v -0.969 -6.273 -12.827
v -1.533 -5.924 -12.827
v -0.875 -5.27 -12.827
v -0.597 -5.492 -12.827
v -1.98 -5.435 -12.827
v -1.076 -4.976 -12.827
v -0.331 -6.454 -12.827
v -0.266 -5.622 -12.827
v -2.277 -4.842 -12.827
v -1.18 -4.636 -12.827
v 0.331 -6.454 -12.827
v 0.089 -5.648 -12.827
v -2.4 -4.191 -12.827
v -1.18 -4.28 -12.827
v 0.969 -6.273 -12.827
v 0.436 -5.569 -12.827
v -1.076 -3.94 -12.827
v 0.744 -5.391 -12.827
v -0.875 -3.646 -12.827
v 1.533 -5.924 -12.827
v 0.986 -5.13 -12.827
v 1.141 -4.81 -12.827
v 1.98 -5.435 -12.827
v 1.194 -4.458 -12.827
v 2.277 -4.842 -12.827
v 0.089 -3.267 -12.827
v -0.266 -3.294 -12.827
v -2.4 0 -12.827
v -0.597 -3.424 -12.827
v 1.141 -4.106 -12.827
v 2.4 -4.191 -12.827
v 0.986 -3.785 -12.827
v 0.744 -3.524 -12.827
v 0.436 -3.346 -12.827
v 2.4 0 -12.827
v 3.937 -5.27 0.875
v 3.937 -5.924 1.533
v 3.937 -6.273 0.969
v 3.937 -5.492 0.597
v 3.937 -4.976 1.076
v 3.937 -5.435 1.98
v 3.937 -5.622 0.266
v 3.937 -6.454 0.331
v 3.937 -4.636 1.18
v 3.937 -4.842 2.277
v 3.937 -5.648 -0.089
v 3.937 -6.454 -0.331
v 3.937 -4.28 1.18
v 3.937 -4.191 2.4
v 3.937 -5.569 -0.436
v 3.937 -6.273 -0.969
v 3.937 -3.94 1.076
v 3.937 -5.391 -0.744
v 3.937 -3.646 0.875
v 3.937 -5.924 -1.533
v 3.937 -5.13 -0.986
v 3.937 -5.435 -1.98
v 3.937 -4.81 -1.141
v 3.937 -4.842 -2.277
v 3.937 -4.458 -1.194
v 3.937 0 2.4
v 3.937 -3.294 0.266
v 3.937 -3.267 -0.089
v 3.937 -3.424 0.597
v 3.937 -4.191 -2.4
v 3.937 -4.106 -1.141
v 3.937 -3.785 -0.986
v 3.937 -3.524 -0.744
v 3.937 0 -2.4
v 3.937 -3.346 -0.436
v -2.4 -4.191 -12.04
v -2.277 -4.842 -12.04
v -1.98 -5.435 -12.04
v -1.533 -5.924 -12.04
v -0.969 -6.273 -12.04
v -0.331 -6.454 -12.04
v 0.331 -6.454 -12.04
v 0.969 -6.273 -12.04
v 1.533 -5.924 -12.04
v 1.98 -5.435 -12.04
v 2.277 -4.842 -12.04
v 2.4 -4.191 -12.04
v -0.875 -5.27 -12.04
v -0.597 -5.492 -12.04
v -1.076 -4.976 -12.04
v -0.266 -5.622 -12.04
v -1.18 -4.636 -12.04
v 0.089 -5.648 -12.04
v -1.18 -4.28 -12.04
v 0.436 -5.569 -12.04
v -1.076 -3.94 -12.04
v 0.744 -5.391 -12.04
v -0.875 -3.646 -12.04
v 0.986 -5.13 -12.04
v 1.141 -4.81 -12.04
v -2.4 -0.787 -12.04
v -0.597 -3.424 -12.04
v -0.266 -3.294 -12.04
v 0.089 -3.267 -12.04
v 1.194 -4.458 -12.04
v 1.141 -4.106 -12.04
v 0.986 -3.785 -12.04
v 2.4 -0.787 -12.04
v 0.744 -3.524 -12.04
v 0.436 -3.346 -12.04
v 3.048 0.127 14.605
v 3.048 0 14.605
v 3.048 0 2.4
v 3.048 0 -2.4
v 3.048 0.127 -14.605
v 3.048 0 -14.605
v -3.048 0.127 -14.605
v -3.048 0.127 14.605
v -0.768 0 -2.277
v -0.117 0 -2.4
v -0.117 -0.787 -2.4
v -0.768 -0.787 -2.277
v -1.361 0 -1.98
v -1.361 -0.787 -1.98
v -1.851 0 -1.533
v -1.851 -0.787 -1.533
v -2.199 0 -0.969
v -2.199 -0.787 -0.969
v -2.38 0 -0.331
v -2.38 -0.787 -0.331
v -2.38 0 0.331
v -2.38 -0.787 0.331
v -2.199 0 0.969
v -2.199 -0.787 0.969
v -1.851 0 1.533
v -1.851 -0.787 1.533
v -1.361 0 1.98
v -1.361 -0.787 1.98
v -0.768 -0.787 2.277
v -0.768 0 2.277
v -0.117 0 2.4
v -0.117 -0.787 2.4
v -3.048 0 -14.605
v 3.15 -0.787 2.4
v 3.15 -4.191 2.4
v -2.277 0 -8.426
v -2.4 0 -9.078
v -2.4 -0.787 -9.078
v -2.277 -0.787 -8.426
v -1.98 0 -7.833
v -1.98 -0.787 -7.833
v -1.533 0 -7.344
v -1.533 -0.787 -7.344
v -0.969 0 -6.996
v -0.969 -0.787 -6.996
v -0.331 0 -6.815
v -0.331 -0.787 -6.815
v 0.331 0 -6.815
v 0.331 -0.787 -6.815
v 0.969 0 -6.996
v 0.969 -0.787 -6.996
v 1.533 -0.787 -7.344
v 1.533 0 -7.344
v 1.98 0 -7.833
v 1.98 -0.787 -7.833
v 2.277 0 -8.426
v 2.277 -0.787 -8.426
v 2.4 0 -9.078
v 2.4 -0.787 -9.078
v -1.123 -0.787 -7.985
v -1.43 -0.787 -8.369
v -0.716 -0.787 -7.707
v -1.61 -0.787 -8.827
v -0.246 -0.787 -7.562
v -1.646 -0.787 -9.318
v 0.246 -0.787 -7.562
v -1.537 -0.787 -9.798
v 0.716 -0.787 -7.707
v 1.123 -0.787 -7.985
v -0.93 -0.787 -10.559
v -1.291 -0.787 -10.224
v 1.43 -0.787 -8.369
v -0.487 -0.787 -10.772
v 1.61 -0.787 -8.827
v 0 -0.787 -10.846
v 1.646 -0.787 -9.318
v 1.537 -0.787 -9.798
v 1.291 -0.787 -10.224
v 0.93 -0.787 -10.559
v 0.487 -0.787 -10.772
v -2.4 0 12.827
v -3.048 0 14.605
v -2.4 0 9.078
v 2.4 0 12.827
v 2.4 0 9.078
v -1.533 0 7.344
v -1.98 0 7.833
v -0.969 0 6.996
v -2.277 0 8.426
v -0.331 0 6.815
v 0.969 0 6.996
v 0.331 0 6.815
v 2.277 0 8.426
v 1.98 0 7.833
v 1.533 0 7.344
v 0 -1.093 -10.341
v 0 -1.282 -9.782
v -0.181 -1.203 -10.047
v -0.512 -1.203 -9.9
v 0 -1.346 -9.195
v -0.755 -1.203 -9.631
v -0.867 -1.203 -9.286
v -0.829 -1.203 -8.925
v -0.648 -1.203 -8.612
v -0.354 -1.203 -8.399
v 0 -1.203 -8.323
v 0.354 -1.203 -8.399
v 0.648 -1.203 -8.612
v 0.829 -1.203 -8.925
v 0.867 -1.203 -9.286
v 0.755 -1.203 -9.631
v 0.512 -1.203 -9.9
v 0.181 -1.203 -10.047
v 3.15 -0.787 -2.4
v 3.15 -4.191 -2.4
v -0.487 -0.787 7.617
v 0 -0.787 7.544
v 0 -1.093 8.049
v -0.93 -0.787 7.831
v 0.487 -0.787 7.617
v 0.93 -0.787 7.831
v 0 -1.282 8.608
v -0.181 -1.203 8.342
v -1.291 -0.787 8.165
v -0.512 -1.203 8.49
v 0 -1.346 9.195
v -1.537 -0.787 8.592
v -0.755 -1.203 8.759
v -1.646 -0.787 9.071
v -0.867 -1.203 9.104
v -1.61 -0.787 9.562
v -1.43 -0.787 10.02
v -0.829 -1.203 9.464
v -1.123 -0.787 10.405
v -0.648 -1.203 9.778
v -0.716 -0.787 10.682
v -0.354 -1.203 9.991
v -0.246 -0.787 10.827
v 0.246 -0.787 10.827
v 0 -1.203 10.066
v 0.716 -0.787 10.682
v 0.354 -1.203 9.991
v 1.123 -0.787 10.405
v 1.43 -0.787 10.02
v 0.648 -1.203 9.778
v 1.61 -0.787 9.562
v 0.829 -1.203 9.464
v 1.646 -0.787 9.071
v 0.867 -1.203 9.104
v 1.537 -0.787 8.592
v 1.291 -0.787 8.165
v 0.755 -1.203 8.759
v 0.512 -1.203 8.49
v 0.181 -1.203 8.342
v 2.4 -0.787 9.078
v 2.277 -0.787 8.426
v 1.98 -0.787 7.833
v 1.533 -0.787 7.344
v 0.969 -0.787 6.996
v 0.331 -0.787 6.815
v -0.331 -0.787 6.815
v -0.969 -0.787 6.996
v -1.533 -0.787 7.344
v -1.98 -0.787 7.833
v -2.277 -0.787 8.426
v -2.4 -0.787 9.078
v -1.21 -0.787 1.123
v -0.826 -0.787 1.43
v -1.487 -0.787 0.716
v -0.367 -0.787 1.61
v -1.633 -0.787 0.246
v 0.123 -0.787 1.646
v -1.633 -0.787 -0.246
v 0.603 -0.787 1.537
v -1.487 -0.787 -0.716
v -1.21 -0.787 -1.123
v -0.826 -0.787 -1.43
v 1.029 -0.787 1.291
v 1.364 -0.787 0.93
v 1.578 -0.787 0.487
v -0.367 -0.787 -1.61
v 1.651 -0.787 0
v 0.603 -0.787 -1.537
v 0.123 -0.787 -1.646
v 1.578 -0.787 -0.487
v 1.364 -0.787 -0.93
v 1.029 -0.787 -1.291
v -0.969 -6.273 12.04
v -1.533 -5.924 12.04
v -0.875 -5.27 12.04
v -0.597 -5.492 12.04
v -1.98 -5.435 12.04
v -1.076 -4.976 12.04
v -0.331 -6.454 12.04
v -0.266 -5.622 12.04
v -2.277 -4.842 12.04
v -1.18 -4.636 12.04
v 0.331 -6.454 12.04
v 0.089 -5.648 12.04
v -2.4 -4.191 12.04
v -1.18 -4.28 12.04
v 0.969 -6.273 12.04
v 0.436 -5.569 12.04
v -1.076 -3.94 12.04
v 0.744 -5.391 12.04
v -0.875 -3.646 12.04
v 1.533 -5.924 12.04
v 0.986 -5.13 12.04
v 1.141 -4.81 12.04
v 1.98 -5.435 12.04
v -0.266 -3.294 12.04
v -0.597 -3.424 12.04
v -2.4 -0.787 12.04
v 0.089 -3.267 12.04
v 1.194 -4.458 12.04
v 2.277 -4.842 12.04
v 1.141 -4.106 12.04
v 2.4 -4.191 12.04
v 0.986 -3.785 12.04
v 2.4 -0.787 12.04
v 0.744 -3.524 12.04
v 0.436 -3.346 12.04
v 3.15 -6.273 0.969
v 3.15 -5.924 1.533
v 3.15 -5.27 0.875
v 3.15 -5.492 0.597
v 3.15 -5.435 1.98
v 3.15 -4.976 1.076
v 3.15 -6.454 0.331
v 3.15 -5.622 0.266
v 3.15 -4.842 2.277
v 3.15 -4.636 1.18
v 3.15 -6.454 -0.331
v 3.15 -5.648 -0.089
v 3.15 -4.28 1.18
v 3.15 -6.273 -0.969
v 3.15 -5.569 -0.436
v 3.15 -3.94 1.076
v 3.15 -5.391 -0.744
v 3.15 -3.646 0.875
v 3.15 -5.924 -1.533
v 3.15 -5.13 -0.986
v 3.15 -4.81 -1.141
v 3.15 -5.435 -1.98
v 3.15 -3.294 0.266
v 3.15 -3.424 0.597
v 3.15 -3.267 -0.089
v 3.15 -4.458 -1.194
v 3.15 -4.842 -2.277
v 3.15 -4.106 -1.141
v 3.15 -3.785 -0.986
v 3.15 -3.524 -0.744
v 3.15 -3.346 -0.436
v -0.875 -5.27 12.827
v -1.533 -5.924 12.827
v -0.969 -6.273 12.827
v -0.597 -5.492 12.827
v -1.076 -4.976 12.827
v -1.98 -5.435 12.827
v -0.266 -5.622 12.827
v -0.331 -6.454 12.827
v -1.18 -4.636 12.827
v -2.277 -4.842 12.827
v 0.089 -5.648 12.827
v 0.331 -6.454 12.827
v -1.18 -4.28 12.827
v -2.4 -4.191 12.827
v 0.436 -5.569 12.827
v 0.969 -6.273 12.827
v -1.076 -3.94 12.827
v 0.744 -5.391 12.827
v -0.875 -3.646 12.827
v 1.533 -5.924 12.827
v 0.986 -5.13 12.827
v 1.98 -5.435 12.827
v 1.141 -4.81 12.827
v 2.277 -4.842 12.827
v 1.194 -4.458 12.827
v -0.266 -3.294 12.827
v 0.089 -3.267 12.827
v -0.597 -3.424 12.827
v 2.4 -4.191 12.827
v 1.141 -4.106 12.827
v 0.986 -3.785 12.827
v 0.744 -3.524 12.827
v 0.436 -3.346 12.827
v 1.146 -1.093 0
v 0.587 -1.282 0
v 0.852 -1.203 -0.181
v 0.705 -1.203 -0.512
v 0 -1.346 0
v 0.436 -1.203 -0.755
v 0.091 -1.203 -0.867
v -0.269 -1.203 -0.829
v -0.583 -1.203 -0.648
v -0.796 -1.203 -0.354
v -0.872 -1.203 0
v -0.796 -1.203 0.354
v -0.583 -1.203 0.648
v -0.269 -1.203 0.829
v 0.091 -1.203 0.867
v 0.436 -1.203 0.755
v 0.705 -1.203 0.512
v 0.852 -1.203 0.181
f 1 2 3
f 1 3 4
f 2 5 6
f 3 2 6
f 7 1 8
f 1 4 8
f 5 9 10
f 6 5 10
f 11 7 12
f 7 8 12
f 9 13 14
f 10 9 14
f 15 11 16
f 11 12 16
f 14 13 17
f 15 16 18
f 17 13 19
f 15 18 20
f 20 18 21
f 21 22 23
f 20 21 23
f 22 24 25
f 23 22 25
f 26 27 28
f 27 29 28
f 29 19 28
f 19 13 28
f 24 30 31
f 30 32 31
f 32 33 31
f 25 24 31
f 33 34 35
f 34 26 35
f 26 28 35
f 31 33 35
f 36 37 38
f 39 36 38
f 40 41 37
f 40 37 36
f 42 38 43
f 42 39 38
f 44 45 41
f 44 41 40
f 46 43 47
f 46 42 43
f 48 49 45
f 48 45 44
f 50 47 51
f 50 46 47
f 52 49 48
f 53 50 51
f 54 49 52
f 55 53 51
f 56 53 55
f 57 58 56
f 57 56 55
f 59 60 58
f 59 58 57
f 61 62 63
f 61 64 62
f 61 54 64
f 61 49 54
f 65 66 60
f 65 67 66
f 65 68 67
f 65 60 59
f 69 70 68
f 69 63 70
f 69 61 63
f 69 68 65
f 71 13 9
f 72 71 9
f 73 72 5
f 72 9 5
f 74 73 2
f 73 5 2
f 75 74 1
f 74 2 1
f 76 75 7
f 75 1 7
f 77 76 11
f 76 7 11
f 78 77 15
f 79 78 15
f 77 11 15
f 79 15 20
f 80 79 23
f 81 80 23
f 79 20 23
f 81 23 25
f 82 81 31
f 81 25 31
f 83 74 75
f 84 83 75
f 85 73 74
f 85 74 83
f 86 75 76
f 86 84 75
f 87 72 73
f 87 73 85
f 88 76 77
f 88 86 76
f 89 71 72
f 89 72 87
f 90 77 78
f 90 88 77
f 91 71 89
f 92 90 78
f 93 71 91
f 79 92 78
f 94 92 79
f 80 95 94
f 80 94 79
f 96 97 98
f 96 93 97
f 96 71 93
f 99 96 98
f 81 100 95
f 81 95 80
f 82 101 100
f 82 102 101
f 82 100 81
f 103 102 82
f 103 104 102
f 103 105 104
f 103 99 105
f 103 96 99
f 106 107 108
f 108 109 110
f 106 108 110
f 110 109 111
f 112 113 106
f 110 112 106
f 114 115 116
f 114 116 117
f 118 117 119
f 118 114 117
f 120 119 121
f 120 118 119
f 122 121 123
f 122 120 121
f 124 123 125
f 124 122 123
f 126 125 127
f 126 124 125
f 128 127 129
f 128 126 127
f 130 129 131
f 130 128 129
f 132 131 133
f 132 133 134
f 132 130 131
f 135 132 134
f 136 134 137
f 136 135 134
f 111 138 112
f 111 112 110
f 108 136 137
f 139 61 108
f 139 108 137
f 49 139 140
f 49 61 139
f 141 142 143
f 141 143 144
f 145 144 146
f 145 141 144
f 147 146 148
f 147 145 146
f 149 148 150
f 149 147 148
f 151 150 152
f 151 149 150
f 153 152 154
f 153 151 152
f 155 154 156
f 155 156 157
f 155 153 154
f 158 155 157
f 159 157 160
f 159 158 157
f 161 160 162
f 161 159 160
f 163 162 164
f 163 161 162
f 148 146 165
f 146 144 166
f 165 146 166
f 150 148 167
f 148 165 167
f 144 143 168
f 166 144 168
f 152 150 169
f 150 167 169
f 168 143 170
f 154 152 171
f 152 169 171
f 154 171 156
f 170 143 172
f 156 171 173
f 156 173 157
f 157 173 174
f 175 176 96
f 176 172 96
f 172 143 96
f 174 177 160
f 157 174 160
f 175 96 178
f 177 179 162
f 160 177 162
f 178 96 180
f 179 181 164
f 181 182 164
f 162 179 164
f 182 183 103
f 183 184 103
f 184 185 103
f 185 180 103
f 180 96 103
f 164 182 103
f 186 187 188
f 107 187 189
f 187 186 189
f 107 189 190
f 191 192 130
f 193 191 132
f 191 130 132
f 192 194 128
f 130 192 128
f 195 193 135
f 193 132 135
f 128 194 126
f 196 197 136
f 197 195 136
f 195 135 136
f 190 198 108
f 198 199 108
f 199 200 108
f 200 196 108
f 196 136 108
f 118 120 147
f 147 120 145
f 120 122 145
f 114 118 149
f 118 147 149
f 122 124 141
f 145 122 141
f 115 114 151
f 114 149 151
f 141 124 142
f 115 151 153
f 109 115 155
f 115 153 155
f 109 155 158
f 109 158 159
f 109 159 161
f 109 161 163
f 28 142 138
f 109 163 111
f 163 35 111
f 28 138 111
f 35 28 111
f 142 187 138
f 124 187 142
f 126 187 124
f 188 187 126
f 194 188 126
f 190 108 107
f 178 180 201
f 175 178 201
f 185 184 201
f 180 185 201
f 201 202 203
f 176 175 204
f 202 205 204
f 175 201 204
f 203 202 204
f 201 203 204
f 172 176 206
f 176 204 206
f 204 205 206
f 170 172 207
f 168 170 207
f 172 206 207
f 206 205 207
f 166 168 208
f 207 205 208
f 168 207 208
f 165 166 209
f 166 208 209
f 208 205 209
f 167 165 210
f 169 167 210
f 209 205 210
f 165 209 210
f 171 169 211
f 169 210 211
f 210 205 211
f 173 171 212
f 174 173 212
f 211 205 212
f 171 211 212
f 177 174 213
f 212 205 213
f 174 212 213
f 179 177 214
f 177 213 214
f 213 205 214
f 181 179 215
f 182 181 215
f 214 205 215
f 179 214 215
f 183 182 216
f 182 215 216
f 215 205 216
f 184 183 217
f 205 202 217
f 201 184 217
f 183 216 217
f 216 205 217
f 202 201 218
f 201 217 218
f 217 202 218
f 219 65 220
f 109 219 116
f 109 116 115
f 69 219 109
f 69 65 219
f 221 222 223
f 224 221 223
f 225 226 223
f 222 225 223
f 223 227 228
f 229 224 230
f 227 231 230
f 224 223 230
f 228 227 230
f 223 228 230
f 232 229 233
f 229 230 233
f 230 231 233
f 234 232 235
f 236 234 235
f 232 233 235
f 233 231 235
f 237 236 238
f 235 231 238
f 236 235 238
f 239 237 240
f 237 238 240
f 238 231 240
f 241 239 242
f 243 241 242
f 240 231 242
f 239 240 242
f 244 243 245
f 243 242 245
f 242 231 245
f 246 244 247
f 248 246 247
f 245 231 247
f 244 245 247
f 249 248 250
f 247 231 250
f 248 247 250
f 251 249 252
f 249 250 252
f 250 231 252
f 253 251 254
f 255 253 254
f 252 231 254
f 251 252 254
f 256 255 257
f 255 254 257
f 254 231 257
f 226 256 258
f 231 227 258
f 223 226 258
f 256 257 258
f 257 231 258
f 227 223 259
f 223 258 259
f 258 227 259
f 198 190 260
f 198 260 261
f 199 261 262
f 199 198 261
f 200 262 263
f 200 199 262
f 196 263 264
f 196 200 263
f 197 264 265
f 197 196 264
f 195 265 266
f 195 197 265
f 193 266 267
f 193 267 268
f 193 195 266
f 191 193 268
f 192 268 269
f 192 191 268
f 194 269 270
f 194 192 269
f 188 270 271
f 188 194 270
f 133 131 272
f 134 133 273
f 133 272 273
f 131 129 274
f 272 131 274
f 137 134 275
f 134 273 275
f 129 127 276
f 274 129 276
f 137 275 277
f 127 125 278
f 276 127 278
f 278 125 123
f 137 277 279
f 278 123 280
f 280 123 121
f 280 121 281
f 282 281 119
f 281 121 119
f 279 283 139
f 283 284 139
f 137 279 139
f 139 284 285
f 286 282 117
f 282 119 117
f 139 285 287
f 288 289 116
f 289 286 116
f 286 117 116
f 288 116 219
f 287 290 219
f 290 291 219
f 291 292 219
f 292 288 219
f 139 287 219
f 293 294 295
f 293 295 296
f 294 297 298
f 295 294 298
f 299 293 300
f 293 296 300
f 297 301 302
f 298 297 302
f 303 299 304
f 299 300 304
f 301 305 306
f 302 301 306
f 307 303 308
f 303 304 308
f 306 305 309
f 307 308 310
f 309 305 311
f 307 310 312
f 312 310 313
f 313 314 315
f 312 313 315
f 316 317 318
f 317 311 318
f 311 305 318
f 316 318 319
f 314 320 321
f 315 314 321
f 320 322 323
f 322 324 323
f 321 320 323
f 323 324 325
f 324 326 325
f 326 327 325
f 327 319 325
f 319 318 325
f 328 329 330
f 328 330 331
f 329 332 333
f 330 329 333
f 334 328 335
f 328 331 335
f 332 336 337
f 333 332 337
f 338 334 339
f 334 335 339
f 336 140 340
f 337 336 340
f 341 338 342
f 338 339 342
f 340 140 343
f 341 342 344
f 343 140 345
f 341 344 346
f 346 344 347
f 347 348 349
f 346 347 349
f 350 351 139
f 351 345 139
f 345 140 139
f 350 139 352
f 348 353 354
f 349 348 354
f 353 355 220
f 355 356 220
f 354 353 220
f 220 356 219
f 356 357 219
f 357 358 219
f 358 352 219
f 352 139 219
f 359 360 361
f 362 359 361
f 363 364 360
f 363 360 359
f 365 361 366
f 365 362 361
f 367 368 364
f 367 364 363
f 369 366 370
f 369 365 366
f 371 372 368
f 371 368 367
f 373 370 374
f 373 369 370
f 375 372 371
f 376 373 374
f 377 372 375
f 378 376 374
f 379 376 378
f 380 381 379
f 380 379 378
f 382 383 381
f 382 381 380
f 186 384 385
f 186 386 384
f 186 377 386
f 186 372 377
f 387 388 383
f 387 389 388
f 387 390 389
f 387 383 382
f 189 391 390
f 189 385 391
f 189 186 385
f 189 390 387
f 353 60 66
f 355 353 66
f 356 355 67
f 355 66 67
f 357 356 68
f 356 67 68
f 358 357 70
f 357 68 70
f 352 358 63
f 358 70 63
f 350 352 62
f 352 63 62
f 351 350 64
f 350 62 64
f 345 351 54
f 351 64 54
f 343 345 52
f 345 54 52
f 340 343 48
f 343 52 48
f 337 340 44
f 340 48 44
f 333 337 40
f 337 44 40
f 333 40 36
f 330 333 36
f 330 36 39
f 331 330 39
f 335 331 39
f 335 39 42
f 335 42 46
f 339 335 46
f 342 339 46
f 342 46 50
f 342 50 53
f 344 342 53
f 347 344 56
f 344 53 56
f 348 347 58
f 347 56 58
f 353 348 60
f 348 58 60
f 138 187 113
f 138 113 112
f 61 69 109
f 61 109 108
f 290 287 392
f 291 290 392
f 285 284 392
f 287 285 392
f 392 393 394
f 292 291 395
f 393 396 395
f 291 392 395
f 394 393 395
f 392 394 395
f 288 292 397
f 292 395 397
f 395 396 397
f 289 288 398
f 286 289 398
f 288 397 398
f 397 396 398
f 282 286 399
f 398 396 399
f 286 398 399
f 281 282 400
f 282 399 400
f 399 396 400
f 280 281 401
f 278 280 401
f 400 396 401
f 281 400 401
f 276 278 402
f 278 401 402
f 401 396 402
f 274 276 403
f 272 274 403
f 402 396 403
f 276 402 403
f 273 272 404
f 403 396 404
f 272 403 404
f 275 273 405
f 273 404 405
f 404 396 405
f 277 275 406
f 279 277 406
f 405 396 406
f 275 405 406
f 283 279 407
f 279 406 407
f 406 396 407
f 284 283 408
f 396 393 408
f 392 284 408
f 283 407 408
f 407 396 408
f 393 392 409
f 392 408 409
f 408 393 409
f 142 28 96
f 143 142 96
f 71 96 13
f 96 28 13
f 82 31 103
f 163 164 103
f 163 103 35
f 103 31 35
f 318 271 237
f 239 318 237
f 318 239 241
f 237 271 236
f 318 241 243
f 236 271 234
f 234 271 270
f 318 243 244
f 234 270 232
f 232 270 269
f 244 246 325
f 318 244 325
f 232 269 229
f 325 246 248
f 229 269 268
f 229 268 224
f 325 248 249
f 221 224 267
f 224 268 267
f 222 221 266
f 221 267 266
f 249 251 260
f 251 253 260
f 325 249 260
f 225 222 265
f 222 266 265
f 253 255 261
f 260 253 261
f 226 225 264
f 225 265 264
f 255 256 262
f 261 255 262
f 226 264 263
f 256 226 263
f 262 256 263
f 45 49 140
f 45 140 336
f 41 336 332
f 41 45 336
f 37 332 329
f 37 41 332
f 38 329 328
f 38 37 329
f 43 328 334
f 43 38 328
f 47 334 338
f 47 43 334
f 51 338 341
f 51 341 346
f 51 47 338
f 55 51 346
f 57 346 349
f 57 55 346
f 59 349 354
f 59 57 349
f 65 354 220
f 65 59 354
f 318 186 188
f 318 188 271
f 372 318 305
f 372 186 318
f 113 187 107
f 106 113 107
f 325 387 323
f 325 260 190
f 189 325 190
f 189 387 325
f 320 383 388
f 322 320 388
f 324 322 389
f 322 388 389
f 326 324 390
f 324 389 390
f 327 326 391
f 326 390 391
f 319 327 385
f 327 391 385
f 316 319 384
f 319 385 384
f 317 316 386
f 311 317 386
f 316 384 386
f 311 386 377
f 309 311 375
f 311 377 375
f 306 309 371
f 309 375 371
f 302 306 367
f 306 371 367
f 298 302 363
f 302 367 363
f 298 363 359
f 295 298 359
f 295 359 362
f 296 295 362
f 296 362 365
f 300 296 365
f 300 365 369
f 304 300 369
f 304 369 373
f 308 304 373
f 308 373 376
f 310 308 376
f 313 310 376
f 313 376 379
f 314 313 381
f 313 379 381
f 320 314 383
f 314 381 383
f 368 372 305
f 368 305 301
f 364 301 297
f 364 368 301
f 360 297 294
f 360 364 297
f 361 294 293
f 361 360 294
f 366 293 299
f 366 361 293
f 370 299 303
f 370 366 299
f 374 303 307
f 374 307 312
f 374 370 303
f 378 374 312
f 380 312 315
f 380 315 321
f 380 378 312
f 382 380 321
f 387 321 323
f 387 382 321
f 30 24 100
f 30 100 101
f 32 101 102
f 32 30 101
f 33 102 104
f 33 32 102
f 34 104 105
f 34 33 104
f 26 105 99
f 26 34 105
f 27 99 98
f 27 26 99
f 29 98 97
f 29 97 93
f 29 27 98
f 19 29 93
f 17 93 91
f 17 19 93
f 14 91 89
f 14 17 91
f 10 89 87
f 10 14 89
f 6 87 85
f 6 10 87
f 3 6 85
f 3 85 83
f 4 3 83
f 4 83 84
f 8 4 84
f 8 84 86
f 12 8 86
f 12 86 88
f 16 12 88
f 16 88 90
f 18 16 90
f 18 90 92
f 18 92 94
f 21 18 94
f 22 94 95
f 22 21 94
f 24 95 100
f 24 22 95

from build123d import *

# Parameters (mm, degrees)
SKETCH1_W           = 6.096
SKETCH1_H           = 29.21
BOSS_EXTRUDE1_DEPTH = 0.127
BOSS_EXTRUDE2_DEPTH = 0.7874
BOSS_EXTRUDE3_DEPTH = 0.7874
BOSS_EXTRUDE4_DEPTH = 0.7874
SKETCH5_R           = 1.1938
BOSS_EXTRUDE5_DEPTH = 0.7874
SKETCH6_R           = 1.1938
BOSS_EXTRUDE6_DEPTH = 0.7874
BOSS_EXTRUDE7_START = 0.7874
SKETCH7_R           = 1.1938
BOSS_EXTRUDE7_DEPTH = 0.7874


with BuildPart() as part:
    # Sketch1 → Boss-Extrude1 (new body)
    with BuildSketch(Plane(origin=(0, 0, 0), x_dir=(1, 0, 0), z_dir=(0, 1, 0))):
        Rectangle(SKETCH1_W, SKETCH1_H)
    extrude(amount=BOSS_EXTRUDE1_DEPTH)

    # Sketch2 → Boss-Extrude2 (add)
    with BuildSketch(Plane(origin=(0, 0, 0), x_dir=(1, 0, 0), z_dir=(0, 1, 0))):
        with BuildLine():
            Line((-0.1171575, -2.4003), (3.5404425, -2.4003))
            Line((3.5404425, -2.4003), (3.5404425, 2.4003))
            Line((3.5404425, 2.4003), (-0.1171575, 2.4003))
            ThreePointArc((-0.1171575, 2.4003), (-2.4031575, 0), (-0.1171575, -2.4003))
        make_face()
    extrude(amount=-BOSS_EXTRUDE2_DEPTH)

    # Sketch3 → Boss-Extrude3 (add)
    with BuildSketch(Plane(origin=(0, 0, 0), x_dir=(1, 0, 0), z_dir=(0, 1, 0))):
        with BuildLine():
            Line((2.4003, 9.0776425), (2.4003, 12.7352425))
            Line((2.4003, 12.7352425), (-2.4003, 12.7352425))
            Line((-2.4003, 12.7352425), (-2.4003, 9.0776425))
            ThreePointArc((-2.4003, 9.0776425), (0, 6.7916425), (2.4003, 9.0776425))
        make_face()
    extrude(amount=-BOSS_EXTRUDE3_DEPTH)

    # Sketch4 → Boss-Extrude4 (add)
    with BuildSketch(Plane(origin=(0, 0, 0), x_dir=(1, 0, 0), z_dir=(0, 1, 0))):
        with BuildLine():
            Line((-2.4003, -12.7352425), (2.4003, -12.7352425))
            Line((2.4003, -12.7352425), (2.4003, -9.0776425))
            ThreePointArc((2.4003, -9.0776425), (0, -6.7916425), (-2.4003, -9.0776425))
            Line((-2.4003, -9.0776425), (-2.4003, -12.7352425))
        make_face()
    extrude(amount=-BOSS_EXTRUDE4_DEPTH)

    # Sketch5 → Boss-Extrude5 (add)
    with BuildSketch(Plane(origin=(3.937, 0, 0), x_dir=(0, 0, -1), z_dir=(1, 0, 0))):
        with BuildLine():
            Line((-2.4003, 0), (-2.4003, -4.191))
            ThreePointArc((-2.4003, -4.191), (0, -6.477), (2.4003, -4.191))
            Line((2.4003, -4.191), (2.4003, 0))
            Line((2.4003, 0), (-2.4003, 0))
        make_face()
        with Locations((0, -4.4577)):
            Circle(SKETCH5_R, mode=Mode.SUBTRACT)
    extrude(amount=-BOSS_EXTRUDE5_DEPTH)

    # Sketch6 → Boss-Extrude6 (add)
    with BuildSketch(Plane.XY.offset(12.827)):
        with BuildLine():
            Line((-2.4003, 0), (-2.4003, -4.191))
            ThreePointArc((-2.4003, -4.191), (0, -6.477), (2.4003, -4.191))
            Line((2.4003, -4.191), (2.4003, 0))
            Line((2.4003, 0), (-2.4003, 0))
        make_face()
        with Locations((0, -4.4577)):
            Circle(SKETCH6_R, mode=Mode.SUBTRACT)
    extrude(amount=-BOSS_EXTRUDE6_DEPTH)

    # Sketch7 → Boss-Extrude7 (add)
    with BuildSketch(Plane.XY.offset(-12.827).offset(BOSS_EXTRUDE7_START)):
        with BuildLine():
            Line((-2.4003, 0), (-2.4003, -4.191))
            ThreePointArc((-2.4003, -4.191), (0, -6.477), (2.4003, -4.191))
            Line((2.4003, -4.191), (2.4003, 0))
            Line((2.4003, 0), (-2.4003, 0))
        make_face()
        with Locations((0, -4.4577)):
            Circle(SKETCH7_R, mode=Mode.SUBTRACT)
    extrude(amount=-BOSS_EXTRUDE7_DEPTH)

    # Sketch8 → Revolve1 (revolve)
    with BuildSketch(Plane.XY):
        with BuildLine():
            Line((0, 0), (1.651, 0))
            Line((1.651, 0), (1.651, -0.7874))
            ThreePointArc((1.651, -0.7874), (0.871501354, -1.202713091), (0, -1.3462))
            Line((0, -1.3462), (0, 0))
        make_face()
    revolve(axis=Axis((0, -1.3462, 0), (0, 1, 0)))

    # Sketch9 → Revolve2 (revolve)
    with BuildSketch(Plane(origin=(0, 0, 0), x_dir=(0, 0, -1), z_dir=(1, 0, 0))):
        with BuildLine():
            Line((9.1948, 0), (10.8458, 0))
            Line((10.8458, 0), (10.8458, -0.7874))
            ThreePointArc((10.8458, -0.7874), (10.066301354, -1.202713091), (9.1948, -1.3462))
            Line((9.1948, -1.3462), (9.1948, 0))
        make_face()
    revolve(axis=Axis((0, -1.3462, -9.1948), (0, 1, 0)))

    # Sketch10 → Revolve3 (revolve)
    with BuildSketch(Plane(origin=(0, 0, 0), x_dir=(0, 0, -1), z_dir=(1, 0, 0))):
        with BuildLine():
            Line((-9.1948, 0), (-7.5438, 0))
            Line((-7.5438, 0), (-7.5438, -0.7874))
            ThreePointArc((-7.5438, -0.7874), (-8.323298646, -1.202713091), (-9.1948, -1.3462))
            Line((-9.1948, -1.3462), (-9.1948, 0))
        make_face()
    revolve(axis=Axis((0, -1.3462, 9.1948), (0, 1, 0)))


solid = part.part
